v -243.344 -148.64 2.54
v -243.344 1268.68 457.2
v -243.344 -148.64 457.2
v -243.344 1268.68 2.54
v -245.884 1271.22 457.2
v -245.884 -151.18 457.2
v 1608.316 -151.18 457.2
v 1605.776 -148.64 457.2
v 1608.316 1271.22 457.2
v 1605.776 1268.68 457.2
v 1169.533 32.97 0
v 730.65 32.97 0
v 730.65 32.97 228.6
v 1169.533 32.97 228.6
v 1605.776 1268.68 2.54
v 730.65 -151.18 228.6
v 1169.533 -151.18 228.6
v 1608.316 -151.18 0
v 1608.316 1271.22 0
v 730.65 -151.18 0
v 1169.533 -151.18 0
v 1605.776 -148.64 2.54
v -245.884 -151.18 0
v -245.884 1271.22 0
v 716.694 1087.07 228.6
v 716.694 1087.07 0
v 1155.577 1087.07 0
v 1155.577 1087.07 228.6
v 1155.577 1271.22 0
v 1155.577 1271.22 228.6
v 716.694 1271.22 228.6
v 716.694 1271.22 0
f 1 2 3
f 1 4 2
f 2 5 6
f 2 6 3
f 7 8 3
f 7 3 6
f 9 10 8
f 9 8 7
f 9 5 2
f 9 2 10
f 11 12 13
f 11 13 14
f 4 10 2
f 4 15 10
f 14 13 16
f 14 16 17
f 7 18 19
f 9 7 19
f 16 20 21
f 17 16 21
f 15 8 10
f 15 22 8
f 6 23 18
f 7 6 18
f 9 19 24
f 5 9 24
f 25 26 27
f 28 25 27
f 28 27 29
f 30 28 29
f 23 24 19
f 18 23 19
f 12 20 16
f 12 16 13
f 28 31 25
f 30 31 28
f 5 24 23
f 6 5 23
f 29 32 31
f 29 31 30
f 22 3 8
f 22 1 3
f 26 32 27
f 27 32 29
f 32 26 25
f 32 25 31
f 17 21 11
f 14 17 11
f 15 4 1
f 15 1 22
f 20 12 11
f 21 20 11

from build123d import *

# Parameters (mm, degrees)
F0_W     = 438.883424
F0_H     = 184.15
F1_DEPTH = 228.6
F2_DEPTH = 457.2
F3_T     = -2.54


with BuildPart() as f1:
    # F0 (on Top) → F1 (new body)
    with BuildSketch(Plane.XY):
        with Locations((950.091481, -59.105012)):
            Rectangle(F0_W, F0_H)
        with Locations((936.135352, 1179.144988)):
            Rectangle(F0_W, F0_H)
    extrude(amount=F1_DEPTH)


with BuildPart() as f2:
    # F0 (on Top) → F2 (new body)
    with BuildSketch(Plane.XY):
        Polygon((716.69364, 1271.219988), (-245.883688, 1271.219988), (-245.883688, -151.180012), (730.649769, -151.180012), (730.649769, 32.969988), (1169.533193, 32.969988), (1169.533193, -151.180012), (1608.316312, -151.180012), (1608.316312, 1271.219988), (1155.577064, 1271.219988), (1155.577064, 1087.069988), (716.69364, 1087.069988), align=None)
        with Locations((936.135352, 1179.144988)):
            Rectangle(F0_W, F0_H)
        with Locations((950.091481, -59.105012)):
            Rectangle(F0_W, F0_H)
    extrude(amount=F2_DEPTH)

    # F3
    f3_openings = [f2.faces().sort_by_distance(p)[0] for p in [
        (681.216312, 560.019988, 457.2),
    ]]
    offset(amount=F3_T, openings=f3_openings)


solid = Compound([f1.part, f2.part])
